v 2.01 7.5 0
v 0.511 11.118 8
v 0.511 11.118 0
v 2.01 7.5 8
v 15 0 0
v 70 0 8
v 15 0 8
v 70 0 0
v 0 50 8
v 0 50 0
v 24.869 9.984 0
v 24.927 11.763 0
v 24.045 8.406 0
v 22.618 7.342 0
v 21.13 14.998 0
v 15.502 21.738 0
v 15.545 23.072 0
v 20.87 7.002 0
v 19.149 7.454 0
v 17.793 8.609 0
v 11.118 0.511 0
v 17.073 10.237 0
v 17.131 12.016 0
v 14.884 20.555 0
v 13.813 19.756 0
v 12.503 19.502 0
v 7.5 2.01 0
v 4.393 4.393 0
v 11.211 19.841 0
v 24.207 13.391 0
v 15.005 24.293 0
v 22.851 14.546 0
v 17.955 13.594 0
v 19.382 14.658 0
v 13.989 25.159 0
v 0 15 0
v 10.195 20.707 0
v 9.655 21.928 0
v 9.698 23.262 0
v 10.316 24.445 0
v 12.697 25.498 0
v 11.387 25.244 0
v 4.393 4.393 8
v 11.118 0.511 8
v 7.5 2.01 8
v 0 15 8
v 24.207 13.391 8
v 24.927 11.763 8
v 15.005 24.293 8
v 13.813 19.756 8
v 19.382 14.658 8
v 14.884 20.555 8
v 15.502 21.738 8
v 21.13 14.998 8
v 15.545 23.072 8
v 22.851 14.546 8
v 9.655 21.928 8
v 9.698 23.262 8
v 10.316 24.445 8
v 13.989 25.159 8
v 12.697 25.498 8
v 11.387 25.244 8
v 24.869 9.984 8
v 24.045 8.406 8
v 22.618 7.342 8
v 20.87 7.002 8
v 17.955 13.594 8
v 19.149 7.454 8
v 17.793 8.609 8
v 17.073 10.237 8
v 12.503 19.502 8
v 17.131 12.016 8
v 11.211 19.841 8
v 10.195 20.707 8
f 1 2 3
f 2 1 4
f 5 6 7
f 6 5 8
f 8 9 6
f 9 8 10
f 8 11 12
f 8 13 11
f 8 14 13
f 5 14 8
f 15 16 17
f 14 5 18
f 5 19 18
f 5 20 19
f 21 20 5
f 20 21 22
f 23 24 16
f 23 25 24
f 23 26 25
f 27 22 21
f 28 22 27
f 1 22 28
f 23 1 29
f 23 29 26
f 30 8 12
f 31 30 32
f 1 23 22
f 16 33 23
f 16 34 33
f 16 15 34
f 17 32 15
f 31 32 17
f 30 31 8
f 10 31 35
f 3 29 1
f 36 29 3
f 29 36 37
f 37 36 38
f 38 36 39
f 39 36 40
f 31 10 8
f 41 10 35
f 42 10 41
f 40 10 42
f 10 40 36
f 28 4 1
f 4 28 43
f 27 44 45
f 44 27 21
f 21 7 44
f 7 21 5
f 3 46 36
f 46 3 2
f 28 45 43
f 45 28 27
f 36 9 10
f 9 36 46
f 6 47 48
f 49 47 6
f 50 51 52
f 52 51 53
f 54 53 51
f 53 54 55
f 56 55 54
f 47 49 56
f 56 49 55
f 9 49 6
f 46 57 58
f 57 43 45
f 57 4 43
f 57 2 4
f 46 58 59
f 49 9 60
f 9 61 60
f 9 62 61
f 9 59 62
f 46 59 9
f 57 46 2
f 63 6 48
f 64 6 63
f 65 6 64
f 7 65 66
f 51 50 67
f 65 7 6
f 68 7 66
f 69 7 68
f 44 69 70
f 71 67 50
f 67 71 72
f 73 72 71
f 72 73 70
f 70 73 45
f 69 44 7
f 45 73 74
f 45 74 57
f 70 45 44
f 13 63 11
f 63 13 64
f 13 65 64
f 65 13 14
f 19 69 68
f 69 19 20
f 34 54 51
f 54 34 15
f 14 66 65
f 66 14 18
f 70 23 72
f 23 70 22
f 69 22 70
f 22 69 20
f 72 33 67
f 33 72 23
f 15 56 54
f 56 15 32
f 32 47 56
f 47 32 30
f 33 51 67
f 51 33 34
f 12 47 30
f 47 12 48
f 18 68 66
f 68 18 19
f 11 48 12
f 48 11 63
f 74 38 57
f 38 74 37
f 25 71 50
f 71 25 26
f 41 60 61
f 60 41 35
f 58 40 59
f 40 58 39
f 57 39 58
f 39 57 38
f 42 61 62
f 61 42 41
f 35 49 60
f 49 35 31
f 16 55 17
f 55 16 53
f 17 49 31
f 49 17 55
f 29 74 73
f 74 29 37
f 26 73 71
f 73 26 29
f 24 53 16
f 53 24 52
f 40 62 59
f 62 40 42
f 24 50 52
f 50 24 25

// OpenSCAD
$fn = 32;

// ----------------------------------------------------------------------
// Bracket plate: corner pad 70 x 50, fillet R15
// ----------------------------------------------------------------------

// --- parameters (mm) ---
hole_r = 3;               // bolt hole radius
plate_t = 8;              // plate thickness, Z (extrusion height)
leg_a = 70;               // base leg
leg_b = 50;               // height leg
fillet_r = 15;            // right-angle fillet radius

hole_d1 = 2 * hole_r + 2;
hole_d2 = 2 * hole_r;

profile = [[15, 0], [70, 0], [0, 50], [0, 15], [0.511, 11.118], [2.01, 7.5], [4.393, 4.393], [7.5, 2.01], [11.118, 0.511]];  // primary outline, 9 points, counter clockwise
void_1 = [[24.927, 11.763], [24.207, 13.391], [22.851, 14.546], [21.13, 14.998], [19.382, 14.658], [17.955, 13.594], [17.131, 12.016], [17.073, 10.237], [17.793, 8.609], [19.149, 7.454], [20.87, 7.002], [22.618, 7.342], [24.045, 8.406], [24.869, 9.984]];  // mount hole 1, 14 points
void_2 = [[15.545, 23.072], [15.005, 24.293], [13.989, 25.159], [12.697, 25.498], [11.387, 25.244], [10.316, 24.445], [9.698, 23.262], [9.655, 21.928], [10.195, 20.707], [11.211, 19.841], [12.503, 19.502], [13.813, 19.756], [14.884, 20.555], [15.502, 21.738]];  // mount hole 2, 14 points

// --- the one profile operation ---
difference() {
  linear_extrude(height = plate_t) polygon(points = profile);
  translate([0, 0, -1])
    linear_extrude(height = plate_t + 2) polygon(points = void_1);
  translate([0, 0, -1])
    linear_extrude(height = plate_t + 2) polygon(points = void_2);
}
